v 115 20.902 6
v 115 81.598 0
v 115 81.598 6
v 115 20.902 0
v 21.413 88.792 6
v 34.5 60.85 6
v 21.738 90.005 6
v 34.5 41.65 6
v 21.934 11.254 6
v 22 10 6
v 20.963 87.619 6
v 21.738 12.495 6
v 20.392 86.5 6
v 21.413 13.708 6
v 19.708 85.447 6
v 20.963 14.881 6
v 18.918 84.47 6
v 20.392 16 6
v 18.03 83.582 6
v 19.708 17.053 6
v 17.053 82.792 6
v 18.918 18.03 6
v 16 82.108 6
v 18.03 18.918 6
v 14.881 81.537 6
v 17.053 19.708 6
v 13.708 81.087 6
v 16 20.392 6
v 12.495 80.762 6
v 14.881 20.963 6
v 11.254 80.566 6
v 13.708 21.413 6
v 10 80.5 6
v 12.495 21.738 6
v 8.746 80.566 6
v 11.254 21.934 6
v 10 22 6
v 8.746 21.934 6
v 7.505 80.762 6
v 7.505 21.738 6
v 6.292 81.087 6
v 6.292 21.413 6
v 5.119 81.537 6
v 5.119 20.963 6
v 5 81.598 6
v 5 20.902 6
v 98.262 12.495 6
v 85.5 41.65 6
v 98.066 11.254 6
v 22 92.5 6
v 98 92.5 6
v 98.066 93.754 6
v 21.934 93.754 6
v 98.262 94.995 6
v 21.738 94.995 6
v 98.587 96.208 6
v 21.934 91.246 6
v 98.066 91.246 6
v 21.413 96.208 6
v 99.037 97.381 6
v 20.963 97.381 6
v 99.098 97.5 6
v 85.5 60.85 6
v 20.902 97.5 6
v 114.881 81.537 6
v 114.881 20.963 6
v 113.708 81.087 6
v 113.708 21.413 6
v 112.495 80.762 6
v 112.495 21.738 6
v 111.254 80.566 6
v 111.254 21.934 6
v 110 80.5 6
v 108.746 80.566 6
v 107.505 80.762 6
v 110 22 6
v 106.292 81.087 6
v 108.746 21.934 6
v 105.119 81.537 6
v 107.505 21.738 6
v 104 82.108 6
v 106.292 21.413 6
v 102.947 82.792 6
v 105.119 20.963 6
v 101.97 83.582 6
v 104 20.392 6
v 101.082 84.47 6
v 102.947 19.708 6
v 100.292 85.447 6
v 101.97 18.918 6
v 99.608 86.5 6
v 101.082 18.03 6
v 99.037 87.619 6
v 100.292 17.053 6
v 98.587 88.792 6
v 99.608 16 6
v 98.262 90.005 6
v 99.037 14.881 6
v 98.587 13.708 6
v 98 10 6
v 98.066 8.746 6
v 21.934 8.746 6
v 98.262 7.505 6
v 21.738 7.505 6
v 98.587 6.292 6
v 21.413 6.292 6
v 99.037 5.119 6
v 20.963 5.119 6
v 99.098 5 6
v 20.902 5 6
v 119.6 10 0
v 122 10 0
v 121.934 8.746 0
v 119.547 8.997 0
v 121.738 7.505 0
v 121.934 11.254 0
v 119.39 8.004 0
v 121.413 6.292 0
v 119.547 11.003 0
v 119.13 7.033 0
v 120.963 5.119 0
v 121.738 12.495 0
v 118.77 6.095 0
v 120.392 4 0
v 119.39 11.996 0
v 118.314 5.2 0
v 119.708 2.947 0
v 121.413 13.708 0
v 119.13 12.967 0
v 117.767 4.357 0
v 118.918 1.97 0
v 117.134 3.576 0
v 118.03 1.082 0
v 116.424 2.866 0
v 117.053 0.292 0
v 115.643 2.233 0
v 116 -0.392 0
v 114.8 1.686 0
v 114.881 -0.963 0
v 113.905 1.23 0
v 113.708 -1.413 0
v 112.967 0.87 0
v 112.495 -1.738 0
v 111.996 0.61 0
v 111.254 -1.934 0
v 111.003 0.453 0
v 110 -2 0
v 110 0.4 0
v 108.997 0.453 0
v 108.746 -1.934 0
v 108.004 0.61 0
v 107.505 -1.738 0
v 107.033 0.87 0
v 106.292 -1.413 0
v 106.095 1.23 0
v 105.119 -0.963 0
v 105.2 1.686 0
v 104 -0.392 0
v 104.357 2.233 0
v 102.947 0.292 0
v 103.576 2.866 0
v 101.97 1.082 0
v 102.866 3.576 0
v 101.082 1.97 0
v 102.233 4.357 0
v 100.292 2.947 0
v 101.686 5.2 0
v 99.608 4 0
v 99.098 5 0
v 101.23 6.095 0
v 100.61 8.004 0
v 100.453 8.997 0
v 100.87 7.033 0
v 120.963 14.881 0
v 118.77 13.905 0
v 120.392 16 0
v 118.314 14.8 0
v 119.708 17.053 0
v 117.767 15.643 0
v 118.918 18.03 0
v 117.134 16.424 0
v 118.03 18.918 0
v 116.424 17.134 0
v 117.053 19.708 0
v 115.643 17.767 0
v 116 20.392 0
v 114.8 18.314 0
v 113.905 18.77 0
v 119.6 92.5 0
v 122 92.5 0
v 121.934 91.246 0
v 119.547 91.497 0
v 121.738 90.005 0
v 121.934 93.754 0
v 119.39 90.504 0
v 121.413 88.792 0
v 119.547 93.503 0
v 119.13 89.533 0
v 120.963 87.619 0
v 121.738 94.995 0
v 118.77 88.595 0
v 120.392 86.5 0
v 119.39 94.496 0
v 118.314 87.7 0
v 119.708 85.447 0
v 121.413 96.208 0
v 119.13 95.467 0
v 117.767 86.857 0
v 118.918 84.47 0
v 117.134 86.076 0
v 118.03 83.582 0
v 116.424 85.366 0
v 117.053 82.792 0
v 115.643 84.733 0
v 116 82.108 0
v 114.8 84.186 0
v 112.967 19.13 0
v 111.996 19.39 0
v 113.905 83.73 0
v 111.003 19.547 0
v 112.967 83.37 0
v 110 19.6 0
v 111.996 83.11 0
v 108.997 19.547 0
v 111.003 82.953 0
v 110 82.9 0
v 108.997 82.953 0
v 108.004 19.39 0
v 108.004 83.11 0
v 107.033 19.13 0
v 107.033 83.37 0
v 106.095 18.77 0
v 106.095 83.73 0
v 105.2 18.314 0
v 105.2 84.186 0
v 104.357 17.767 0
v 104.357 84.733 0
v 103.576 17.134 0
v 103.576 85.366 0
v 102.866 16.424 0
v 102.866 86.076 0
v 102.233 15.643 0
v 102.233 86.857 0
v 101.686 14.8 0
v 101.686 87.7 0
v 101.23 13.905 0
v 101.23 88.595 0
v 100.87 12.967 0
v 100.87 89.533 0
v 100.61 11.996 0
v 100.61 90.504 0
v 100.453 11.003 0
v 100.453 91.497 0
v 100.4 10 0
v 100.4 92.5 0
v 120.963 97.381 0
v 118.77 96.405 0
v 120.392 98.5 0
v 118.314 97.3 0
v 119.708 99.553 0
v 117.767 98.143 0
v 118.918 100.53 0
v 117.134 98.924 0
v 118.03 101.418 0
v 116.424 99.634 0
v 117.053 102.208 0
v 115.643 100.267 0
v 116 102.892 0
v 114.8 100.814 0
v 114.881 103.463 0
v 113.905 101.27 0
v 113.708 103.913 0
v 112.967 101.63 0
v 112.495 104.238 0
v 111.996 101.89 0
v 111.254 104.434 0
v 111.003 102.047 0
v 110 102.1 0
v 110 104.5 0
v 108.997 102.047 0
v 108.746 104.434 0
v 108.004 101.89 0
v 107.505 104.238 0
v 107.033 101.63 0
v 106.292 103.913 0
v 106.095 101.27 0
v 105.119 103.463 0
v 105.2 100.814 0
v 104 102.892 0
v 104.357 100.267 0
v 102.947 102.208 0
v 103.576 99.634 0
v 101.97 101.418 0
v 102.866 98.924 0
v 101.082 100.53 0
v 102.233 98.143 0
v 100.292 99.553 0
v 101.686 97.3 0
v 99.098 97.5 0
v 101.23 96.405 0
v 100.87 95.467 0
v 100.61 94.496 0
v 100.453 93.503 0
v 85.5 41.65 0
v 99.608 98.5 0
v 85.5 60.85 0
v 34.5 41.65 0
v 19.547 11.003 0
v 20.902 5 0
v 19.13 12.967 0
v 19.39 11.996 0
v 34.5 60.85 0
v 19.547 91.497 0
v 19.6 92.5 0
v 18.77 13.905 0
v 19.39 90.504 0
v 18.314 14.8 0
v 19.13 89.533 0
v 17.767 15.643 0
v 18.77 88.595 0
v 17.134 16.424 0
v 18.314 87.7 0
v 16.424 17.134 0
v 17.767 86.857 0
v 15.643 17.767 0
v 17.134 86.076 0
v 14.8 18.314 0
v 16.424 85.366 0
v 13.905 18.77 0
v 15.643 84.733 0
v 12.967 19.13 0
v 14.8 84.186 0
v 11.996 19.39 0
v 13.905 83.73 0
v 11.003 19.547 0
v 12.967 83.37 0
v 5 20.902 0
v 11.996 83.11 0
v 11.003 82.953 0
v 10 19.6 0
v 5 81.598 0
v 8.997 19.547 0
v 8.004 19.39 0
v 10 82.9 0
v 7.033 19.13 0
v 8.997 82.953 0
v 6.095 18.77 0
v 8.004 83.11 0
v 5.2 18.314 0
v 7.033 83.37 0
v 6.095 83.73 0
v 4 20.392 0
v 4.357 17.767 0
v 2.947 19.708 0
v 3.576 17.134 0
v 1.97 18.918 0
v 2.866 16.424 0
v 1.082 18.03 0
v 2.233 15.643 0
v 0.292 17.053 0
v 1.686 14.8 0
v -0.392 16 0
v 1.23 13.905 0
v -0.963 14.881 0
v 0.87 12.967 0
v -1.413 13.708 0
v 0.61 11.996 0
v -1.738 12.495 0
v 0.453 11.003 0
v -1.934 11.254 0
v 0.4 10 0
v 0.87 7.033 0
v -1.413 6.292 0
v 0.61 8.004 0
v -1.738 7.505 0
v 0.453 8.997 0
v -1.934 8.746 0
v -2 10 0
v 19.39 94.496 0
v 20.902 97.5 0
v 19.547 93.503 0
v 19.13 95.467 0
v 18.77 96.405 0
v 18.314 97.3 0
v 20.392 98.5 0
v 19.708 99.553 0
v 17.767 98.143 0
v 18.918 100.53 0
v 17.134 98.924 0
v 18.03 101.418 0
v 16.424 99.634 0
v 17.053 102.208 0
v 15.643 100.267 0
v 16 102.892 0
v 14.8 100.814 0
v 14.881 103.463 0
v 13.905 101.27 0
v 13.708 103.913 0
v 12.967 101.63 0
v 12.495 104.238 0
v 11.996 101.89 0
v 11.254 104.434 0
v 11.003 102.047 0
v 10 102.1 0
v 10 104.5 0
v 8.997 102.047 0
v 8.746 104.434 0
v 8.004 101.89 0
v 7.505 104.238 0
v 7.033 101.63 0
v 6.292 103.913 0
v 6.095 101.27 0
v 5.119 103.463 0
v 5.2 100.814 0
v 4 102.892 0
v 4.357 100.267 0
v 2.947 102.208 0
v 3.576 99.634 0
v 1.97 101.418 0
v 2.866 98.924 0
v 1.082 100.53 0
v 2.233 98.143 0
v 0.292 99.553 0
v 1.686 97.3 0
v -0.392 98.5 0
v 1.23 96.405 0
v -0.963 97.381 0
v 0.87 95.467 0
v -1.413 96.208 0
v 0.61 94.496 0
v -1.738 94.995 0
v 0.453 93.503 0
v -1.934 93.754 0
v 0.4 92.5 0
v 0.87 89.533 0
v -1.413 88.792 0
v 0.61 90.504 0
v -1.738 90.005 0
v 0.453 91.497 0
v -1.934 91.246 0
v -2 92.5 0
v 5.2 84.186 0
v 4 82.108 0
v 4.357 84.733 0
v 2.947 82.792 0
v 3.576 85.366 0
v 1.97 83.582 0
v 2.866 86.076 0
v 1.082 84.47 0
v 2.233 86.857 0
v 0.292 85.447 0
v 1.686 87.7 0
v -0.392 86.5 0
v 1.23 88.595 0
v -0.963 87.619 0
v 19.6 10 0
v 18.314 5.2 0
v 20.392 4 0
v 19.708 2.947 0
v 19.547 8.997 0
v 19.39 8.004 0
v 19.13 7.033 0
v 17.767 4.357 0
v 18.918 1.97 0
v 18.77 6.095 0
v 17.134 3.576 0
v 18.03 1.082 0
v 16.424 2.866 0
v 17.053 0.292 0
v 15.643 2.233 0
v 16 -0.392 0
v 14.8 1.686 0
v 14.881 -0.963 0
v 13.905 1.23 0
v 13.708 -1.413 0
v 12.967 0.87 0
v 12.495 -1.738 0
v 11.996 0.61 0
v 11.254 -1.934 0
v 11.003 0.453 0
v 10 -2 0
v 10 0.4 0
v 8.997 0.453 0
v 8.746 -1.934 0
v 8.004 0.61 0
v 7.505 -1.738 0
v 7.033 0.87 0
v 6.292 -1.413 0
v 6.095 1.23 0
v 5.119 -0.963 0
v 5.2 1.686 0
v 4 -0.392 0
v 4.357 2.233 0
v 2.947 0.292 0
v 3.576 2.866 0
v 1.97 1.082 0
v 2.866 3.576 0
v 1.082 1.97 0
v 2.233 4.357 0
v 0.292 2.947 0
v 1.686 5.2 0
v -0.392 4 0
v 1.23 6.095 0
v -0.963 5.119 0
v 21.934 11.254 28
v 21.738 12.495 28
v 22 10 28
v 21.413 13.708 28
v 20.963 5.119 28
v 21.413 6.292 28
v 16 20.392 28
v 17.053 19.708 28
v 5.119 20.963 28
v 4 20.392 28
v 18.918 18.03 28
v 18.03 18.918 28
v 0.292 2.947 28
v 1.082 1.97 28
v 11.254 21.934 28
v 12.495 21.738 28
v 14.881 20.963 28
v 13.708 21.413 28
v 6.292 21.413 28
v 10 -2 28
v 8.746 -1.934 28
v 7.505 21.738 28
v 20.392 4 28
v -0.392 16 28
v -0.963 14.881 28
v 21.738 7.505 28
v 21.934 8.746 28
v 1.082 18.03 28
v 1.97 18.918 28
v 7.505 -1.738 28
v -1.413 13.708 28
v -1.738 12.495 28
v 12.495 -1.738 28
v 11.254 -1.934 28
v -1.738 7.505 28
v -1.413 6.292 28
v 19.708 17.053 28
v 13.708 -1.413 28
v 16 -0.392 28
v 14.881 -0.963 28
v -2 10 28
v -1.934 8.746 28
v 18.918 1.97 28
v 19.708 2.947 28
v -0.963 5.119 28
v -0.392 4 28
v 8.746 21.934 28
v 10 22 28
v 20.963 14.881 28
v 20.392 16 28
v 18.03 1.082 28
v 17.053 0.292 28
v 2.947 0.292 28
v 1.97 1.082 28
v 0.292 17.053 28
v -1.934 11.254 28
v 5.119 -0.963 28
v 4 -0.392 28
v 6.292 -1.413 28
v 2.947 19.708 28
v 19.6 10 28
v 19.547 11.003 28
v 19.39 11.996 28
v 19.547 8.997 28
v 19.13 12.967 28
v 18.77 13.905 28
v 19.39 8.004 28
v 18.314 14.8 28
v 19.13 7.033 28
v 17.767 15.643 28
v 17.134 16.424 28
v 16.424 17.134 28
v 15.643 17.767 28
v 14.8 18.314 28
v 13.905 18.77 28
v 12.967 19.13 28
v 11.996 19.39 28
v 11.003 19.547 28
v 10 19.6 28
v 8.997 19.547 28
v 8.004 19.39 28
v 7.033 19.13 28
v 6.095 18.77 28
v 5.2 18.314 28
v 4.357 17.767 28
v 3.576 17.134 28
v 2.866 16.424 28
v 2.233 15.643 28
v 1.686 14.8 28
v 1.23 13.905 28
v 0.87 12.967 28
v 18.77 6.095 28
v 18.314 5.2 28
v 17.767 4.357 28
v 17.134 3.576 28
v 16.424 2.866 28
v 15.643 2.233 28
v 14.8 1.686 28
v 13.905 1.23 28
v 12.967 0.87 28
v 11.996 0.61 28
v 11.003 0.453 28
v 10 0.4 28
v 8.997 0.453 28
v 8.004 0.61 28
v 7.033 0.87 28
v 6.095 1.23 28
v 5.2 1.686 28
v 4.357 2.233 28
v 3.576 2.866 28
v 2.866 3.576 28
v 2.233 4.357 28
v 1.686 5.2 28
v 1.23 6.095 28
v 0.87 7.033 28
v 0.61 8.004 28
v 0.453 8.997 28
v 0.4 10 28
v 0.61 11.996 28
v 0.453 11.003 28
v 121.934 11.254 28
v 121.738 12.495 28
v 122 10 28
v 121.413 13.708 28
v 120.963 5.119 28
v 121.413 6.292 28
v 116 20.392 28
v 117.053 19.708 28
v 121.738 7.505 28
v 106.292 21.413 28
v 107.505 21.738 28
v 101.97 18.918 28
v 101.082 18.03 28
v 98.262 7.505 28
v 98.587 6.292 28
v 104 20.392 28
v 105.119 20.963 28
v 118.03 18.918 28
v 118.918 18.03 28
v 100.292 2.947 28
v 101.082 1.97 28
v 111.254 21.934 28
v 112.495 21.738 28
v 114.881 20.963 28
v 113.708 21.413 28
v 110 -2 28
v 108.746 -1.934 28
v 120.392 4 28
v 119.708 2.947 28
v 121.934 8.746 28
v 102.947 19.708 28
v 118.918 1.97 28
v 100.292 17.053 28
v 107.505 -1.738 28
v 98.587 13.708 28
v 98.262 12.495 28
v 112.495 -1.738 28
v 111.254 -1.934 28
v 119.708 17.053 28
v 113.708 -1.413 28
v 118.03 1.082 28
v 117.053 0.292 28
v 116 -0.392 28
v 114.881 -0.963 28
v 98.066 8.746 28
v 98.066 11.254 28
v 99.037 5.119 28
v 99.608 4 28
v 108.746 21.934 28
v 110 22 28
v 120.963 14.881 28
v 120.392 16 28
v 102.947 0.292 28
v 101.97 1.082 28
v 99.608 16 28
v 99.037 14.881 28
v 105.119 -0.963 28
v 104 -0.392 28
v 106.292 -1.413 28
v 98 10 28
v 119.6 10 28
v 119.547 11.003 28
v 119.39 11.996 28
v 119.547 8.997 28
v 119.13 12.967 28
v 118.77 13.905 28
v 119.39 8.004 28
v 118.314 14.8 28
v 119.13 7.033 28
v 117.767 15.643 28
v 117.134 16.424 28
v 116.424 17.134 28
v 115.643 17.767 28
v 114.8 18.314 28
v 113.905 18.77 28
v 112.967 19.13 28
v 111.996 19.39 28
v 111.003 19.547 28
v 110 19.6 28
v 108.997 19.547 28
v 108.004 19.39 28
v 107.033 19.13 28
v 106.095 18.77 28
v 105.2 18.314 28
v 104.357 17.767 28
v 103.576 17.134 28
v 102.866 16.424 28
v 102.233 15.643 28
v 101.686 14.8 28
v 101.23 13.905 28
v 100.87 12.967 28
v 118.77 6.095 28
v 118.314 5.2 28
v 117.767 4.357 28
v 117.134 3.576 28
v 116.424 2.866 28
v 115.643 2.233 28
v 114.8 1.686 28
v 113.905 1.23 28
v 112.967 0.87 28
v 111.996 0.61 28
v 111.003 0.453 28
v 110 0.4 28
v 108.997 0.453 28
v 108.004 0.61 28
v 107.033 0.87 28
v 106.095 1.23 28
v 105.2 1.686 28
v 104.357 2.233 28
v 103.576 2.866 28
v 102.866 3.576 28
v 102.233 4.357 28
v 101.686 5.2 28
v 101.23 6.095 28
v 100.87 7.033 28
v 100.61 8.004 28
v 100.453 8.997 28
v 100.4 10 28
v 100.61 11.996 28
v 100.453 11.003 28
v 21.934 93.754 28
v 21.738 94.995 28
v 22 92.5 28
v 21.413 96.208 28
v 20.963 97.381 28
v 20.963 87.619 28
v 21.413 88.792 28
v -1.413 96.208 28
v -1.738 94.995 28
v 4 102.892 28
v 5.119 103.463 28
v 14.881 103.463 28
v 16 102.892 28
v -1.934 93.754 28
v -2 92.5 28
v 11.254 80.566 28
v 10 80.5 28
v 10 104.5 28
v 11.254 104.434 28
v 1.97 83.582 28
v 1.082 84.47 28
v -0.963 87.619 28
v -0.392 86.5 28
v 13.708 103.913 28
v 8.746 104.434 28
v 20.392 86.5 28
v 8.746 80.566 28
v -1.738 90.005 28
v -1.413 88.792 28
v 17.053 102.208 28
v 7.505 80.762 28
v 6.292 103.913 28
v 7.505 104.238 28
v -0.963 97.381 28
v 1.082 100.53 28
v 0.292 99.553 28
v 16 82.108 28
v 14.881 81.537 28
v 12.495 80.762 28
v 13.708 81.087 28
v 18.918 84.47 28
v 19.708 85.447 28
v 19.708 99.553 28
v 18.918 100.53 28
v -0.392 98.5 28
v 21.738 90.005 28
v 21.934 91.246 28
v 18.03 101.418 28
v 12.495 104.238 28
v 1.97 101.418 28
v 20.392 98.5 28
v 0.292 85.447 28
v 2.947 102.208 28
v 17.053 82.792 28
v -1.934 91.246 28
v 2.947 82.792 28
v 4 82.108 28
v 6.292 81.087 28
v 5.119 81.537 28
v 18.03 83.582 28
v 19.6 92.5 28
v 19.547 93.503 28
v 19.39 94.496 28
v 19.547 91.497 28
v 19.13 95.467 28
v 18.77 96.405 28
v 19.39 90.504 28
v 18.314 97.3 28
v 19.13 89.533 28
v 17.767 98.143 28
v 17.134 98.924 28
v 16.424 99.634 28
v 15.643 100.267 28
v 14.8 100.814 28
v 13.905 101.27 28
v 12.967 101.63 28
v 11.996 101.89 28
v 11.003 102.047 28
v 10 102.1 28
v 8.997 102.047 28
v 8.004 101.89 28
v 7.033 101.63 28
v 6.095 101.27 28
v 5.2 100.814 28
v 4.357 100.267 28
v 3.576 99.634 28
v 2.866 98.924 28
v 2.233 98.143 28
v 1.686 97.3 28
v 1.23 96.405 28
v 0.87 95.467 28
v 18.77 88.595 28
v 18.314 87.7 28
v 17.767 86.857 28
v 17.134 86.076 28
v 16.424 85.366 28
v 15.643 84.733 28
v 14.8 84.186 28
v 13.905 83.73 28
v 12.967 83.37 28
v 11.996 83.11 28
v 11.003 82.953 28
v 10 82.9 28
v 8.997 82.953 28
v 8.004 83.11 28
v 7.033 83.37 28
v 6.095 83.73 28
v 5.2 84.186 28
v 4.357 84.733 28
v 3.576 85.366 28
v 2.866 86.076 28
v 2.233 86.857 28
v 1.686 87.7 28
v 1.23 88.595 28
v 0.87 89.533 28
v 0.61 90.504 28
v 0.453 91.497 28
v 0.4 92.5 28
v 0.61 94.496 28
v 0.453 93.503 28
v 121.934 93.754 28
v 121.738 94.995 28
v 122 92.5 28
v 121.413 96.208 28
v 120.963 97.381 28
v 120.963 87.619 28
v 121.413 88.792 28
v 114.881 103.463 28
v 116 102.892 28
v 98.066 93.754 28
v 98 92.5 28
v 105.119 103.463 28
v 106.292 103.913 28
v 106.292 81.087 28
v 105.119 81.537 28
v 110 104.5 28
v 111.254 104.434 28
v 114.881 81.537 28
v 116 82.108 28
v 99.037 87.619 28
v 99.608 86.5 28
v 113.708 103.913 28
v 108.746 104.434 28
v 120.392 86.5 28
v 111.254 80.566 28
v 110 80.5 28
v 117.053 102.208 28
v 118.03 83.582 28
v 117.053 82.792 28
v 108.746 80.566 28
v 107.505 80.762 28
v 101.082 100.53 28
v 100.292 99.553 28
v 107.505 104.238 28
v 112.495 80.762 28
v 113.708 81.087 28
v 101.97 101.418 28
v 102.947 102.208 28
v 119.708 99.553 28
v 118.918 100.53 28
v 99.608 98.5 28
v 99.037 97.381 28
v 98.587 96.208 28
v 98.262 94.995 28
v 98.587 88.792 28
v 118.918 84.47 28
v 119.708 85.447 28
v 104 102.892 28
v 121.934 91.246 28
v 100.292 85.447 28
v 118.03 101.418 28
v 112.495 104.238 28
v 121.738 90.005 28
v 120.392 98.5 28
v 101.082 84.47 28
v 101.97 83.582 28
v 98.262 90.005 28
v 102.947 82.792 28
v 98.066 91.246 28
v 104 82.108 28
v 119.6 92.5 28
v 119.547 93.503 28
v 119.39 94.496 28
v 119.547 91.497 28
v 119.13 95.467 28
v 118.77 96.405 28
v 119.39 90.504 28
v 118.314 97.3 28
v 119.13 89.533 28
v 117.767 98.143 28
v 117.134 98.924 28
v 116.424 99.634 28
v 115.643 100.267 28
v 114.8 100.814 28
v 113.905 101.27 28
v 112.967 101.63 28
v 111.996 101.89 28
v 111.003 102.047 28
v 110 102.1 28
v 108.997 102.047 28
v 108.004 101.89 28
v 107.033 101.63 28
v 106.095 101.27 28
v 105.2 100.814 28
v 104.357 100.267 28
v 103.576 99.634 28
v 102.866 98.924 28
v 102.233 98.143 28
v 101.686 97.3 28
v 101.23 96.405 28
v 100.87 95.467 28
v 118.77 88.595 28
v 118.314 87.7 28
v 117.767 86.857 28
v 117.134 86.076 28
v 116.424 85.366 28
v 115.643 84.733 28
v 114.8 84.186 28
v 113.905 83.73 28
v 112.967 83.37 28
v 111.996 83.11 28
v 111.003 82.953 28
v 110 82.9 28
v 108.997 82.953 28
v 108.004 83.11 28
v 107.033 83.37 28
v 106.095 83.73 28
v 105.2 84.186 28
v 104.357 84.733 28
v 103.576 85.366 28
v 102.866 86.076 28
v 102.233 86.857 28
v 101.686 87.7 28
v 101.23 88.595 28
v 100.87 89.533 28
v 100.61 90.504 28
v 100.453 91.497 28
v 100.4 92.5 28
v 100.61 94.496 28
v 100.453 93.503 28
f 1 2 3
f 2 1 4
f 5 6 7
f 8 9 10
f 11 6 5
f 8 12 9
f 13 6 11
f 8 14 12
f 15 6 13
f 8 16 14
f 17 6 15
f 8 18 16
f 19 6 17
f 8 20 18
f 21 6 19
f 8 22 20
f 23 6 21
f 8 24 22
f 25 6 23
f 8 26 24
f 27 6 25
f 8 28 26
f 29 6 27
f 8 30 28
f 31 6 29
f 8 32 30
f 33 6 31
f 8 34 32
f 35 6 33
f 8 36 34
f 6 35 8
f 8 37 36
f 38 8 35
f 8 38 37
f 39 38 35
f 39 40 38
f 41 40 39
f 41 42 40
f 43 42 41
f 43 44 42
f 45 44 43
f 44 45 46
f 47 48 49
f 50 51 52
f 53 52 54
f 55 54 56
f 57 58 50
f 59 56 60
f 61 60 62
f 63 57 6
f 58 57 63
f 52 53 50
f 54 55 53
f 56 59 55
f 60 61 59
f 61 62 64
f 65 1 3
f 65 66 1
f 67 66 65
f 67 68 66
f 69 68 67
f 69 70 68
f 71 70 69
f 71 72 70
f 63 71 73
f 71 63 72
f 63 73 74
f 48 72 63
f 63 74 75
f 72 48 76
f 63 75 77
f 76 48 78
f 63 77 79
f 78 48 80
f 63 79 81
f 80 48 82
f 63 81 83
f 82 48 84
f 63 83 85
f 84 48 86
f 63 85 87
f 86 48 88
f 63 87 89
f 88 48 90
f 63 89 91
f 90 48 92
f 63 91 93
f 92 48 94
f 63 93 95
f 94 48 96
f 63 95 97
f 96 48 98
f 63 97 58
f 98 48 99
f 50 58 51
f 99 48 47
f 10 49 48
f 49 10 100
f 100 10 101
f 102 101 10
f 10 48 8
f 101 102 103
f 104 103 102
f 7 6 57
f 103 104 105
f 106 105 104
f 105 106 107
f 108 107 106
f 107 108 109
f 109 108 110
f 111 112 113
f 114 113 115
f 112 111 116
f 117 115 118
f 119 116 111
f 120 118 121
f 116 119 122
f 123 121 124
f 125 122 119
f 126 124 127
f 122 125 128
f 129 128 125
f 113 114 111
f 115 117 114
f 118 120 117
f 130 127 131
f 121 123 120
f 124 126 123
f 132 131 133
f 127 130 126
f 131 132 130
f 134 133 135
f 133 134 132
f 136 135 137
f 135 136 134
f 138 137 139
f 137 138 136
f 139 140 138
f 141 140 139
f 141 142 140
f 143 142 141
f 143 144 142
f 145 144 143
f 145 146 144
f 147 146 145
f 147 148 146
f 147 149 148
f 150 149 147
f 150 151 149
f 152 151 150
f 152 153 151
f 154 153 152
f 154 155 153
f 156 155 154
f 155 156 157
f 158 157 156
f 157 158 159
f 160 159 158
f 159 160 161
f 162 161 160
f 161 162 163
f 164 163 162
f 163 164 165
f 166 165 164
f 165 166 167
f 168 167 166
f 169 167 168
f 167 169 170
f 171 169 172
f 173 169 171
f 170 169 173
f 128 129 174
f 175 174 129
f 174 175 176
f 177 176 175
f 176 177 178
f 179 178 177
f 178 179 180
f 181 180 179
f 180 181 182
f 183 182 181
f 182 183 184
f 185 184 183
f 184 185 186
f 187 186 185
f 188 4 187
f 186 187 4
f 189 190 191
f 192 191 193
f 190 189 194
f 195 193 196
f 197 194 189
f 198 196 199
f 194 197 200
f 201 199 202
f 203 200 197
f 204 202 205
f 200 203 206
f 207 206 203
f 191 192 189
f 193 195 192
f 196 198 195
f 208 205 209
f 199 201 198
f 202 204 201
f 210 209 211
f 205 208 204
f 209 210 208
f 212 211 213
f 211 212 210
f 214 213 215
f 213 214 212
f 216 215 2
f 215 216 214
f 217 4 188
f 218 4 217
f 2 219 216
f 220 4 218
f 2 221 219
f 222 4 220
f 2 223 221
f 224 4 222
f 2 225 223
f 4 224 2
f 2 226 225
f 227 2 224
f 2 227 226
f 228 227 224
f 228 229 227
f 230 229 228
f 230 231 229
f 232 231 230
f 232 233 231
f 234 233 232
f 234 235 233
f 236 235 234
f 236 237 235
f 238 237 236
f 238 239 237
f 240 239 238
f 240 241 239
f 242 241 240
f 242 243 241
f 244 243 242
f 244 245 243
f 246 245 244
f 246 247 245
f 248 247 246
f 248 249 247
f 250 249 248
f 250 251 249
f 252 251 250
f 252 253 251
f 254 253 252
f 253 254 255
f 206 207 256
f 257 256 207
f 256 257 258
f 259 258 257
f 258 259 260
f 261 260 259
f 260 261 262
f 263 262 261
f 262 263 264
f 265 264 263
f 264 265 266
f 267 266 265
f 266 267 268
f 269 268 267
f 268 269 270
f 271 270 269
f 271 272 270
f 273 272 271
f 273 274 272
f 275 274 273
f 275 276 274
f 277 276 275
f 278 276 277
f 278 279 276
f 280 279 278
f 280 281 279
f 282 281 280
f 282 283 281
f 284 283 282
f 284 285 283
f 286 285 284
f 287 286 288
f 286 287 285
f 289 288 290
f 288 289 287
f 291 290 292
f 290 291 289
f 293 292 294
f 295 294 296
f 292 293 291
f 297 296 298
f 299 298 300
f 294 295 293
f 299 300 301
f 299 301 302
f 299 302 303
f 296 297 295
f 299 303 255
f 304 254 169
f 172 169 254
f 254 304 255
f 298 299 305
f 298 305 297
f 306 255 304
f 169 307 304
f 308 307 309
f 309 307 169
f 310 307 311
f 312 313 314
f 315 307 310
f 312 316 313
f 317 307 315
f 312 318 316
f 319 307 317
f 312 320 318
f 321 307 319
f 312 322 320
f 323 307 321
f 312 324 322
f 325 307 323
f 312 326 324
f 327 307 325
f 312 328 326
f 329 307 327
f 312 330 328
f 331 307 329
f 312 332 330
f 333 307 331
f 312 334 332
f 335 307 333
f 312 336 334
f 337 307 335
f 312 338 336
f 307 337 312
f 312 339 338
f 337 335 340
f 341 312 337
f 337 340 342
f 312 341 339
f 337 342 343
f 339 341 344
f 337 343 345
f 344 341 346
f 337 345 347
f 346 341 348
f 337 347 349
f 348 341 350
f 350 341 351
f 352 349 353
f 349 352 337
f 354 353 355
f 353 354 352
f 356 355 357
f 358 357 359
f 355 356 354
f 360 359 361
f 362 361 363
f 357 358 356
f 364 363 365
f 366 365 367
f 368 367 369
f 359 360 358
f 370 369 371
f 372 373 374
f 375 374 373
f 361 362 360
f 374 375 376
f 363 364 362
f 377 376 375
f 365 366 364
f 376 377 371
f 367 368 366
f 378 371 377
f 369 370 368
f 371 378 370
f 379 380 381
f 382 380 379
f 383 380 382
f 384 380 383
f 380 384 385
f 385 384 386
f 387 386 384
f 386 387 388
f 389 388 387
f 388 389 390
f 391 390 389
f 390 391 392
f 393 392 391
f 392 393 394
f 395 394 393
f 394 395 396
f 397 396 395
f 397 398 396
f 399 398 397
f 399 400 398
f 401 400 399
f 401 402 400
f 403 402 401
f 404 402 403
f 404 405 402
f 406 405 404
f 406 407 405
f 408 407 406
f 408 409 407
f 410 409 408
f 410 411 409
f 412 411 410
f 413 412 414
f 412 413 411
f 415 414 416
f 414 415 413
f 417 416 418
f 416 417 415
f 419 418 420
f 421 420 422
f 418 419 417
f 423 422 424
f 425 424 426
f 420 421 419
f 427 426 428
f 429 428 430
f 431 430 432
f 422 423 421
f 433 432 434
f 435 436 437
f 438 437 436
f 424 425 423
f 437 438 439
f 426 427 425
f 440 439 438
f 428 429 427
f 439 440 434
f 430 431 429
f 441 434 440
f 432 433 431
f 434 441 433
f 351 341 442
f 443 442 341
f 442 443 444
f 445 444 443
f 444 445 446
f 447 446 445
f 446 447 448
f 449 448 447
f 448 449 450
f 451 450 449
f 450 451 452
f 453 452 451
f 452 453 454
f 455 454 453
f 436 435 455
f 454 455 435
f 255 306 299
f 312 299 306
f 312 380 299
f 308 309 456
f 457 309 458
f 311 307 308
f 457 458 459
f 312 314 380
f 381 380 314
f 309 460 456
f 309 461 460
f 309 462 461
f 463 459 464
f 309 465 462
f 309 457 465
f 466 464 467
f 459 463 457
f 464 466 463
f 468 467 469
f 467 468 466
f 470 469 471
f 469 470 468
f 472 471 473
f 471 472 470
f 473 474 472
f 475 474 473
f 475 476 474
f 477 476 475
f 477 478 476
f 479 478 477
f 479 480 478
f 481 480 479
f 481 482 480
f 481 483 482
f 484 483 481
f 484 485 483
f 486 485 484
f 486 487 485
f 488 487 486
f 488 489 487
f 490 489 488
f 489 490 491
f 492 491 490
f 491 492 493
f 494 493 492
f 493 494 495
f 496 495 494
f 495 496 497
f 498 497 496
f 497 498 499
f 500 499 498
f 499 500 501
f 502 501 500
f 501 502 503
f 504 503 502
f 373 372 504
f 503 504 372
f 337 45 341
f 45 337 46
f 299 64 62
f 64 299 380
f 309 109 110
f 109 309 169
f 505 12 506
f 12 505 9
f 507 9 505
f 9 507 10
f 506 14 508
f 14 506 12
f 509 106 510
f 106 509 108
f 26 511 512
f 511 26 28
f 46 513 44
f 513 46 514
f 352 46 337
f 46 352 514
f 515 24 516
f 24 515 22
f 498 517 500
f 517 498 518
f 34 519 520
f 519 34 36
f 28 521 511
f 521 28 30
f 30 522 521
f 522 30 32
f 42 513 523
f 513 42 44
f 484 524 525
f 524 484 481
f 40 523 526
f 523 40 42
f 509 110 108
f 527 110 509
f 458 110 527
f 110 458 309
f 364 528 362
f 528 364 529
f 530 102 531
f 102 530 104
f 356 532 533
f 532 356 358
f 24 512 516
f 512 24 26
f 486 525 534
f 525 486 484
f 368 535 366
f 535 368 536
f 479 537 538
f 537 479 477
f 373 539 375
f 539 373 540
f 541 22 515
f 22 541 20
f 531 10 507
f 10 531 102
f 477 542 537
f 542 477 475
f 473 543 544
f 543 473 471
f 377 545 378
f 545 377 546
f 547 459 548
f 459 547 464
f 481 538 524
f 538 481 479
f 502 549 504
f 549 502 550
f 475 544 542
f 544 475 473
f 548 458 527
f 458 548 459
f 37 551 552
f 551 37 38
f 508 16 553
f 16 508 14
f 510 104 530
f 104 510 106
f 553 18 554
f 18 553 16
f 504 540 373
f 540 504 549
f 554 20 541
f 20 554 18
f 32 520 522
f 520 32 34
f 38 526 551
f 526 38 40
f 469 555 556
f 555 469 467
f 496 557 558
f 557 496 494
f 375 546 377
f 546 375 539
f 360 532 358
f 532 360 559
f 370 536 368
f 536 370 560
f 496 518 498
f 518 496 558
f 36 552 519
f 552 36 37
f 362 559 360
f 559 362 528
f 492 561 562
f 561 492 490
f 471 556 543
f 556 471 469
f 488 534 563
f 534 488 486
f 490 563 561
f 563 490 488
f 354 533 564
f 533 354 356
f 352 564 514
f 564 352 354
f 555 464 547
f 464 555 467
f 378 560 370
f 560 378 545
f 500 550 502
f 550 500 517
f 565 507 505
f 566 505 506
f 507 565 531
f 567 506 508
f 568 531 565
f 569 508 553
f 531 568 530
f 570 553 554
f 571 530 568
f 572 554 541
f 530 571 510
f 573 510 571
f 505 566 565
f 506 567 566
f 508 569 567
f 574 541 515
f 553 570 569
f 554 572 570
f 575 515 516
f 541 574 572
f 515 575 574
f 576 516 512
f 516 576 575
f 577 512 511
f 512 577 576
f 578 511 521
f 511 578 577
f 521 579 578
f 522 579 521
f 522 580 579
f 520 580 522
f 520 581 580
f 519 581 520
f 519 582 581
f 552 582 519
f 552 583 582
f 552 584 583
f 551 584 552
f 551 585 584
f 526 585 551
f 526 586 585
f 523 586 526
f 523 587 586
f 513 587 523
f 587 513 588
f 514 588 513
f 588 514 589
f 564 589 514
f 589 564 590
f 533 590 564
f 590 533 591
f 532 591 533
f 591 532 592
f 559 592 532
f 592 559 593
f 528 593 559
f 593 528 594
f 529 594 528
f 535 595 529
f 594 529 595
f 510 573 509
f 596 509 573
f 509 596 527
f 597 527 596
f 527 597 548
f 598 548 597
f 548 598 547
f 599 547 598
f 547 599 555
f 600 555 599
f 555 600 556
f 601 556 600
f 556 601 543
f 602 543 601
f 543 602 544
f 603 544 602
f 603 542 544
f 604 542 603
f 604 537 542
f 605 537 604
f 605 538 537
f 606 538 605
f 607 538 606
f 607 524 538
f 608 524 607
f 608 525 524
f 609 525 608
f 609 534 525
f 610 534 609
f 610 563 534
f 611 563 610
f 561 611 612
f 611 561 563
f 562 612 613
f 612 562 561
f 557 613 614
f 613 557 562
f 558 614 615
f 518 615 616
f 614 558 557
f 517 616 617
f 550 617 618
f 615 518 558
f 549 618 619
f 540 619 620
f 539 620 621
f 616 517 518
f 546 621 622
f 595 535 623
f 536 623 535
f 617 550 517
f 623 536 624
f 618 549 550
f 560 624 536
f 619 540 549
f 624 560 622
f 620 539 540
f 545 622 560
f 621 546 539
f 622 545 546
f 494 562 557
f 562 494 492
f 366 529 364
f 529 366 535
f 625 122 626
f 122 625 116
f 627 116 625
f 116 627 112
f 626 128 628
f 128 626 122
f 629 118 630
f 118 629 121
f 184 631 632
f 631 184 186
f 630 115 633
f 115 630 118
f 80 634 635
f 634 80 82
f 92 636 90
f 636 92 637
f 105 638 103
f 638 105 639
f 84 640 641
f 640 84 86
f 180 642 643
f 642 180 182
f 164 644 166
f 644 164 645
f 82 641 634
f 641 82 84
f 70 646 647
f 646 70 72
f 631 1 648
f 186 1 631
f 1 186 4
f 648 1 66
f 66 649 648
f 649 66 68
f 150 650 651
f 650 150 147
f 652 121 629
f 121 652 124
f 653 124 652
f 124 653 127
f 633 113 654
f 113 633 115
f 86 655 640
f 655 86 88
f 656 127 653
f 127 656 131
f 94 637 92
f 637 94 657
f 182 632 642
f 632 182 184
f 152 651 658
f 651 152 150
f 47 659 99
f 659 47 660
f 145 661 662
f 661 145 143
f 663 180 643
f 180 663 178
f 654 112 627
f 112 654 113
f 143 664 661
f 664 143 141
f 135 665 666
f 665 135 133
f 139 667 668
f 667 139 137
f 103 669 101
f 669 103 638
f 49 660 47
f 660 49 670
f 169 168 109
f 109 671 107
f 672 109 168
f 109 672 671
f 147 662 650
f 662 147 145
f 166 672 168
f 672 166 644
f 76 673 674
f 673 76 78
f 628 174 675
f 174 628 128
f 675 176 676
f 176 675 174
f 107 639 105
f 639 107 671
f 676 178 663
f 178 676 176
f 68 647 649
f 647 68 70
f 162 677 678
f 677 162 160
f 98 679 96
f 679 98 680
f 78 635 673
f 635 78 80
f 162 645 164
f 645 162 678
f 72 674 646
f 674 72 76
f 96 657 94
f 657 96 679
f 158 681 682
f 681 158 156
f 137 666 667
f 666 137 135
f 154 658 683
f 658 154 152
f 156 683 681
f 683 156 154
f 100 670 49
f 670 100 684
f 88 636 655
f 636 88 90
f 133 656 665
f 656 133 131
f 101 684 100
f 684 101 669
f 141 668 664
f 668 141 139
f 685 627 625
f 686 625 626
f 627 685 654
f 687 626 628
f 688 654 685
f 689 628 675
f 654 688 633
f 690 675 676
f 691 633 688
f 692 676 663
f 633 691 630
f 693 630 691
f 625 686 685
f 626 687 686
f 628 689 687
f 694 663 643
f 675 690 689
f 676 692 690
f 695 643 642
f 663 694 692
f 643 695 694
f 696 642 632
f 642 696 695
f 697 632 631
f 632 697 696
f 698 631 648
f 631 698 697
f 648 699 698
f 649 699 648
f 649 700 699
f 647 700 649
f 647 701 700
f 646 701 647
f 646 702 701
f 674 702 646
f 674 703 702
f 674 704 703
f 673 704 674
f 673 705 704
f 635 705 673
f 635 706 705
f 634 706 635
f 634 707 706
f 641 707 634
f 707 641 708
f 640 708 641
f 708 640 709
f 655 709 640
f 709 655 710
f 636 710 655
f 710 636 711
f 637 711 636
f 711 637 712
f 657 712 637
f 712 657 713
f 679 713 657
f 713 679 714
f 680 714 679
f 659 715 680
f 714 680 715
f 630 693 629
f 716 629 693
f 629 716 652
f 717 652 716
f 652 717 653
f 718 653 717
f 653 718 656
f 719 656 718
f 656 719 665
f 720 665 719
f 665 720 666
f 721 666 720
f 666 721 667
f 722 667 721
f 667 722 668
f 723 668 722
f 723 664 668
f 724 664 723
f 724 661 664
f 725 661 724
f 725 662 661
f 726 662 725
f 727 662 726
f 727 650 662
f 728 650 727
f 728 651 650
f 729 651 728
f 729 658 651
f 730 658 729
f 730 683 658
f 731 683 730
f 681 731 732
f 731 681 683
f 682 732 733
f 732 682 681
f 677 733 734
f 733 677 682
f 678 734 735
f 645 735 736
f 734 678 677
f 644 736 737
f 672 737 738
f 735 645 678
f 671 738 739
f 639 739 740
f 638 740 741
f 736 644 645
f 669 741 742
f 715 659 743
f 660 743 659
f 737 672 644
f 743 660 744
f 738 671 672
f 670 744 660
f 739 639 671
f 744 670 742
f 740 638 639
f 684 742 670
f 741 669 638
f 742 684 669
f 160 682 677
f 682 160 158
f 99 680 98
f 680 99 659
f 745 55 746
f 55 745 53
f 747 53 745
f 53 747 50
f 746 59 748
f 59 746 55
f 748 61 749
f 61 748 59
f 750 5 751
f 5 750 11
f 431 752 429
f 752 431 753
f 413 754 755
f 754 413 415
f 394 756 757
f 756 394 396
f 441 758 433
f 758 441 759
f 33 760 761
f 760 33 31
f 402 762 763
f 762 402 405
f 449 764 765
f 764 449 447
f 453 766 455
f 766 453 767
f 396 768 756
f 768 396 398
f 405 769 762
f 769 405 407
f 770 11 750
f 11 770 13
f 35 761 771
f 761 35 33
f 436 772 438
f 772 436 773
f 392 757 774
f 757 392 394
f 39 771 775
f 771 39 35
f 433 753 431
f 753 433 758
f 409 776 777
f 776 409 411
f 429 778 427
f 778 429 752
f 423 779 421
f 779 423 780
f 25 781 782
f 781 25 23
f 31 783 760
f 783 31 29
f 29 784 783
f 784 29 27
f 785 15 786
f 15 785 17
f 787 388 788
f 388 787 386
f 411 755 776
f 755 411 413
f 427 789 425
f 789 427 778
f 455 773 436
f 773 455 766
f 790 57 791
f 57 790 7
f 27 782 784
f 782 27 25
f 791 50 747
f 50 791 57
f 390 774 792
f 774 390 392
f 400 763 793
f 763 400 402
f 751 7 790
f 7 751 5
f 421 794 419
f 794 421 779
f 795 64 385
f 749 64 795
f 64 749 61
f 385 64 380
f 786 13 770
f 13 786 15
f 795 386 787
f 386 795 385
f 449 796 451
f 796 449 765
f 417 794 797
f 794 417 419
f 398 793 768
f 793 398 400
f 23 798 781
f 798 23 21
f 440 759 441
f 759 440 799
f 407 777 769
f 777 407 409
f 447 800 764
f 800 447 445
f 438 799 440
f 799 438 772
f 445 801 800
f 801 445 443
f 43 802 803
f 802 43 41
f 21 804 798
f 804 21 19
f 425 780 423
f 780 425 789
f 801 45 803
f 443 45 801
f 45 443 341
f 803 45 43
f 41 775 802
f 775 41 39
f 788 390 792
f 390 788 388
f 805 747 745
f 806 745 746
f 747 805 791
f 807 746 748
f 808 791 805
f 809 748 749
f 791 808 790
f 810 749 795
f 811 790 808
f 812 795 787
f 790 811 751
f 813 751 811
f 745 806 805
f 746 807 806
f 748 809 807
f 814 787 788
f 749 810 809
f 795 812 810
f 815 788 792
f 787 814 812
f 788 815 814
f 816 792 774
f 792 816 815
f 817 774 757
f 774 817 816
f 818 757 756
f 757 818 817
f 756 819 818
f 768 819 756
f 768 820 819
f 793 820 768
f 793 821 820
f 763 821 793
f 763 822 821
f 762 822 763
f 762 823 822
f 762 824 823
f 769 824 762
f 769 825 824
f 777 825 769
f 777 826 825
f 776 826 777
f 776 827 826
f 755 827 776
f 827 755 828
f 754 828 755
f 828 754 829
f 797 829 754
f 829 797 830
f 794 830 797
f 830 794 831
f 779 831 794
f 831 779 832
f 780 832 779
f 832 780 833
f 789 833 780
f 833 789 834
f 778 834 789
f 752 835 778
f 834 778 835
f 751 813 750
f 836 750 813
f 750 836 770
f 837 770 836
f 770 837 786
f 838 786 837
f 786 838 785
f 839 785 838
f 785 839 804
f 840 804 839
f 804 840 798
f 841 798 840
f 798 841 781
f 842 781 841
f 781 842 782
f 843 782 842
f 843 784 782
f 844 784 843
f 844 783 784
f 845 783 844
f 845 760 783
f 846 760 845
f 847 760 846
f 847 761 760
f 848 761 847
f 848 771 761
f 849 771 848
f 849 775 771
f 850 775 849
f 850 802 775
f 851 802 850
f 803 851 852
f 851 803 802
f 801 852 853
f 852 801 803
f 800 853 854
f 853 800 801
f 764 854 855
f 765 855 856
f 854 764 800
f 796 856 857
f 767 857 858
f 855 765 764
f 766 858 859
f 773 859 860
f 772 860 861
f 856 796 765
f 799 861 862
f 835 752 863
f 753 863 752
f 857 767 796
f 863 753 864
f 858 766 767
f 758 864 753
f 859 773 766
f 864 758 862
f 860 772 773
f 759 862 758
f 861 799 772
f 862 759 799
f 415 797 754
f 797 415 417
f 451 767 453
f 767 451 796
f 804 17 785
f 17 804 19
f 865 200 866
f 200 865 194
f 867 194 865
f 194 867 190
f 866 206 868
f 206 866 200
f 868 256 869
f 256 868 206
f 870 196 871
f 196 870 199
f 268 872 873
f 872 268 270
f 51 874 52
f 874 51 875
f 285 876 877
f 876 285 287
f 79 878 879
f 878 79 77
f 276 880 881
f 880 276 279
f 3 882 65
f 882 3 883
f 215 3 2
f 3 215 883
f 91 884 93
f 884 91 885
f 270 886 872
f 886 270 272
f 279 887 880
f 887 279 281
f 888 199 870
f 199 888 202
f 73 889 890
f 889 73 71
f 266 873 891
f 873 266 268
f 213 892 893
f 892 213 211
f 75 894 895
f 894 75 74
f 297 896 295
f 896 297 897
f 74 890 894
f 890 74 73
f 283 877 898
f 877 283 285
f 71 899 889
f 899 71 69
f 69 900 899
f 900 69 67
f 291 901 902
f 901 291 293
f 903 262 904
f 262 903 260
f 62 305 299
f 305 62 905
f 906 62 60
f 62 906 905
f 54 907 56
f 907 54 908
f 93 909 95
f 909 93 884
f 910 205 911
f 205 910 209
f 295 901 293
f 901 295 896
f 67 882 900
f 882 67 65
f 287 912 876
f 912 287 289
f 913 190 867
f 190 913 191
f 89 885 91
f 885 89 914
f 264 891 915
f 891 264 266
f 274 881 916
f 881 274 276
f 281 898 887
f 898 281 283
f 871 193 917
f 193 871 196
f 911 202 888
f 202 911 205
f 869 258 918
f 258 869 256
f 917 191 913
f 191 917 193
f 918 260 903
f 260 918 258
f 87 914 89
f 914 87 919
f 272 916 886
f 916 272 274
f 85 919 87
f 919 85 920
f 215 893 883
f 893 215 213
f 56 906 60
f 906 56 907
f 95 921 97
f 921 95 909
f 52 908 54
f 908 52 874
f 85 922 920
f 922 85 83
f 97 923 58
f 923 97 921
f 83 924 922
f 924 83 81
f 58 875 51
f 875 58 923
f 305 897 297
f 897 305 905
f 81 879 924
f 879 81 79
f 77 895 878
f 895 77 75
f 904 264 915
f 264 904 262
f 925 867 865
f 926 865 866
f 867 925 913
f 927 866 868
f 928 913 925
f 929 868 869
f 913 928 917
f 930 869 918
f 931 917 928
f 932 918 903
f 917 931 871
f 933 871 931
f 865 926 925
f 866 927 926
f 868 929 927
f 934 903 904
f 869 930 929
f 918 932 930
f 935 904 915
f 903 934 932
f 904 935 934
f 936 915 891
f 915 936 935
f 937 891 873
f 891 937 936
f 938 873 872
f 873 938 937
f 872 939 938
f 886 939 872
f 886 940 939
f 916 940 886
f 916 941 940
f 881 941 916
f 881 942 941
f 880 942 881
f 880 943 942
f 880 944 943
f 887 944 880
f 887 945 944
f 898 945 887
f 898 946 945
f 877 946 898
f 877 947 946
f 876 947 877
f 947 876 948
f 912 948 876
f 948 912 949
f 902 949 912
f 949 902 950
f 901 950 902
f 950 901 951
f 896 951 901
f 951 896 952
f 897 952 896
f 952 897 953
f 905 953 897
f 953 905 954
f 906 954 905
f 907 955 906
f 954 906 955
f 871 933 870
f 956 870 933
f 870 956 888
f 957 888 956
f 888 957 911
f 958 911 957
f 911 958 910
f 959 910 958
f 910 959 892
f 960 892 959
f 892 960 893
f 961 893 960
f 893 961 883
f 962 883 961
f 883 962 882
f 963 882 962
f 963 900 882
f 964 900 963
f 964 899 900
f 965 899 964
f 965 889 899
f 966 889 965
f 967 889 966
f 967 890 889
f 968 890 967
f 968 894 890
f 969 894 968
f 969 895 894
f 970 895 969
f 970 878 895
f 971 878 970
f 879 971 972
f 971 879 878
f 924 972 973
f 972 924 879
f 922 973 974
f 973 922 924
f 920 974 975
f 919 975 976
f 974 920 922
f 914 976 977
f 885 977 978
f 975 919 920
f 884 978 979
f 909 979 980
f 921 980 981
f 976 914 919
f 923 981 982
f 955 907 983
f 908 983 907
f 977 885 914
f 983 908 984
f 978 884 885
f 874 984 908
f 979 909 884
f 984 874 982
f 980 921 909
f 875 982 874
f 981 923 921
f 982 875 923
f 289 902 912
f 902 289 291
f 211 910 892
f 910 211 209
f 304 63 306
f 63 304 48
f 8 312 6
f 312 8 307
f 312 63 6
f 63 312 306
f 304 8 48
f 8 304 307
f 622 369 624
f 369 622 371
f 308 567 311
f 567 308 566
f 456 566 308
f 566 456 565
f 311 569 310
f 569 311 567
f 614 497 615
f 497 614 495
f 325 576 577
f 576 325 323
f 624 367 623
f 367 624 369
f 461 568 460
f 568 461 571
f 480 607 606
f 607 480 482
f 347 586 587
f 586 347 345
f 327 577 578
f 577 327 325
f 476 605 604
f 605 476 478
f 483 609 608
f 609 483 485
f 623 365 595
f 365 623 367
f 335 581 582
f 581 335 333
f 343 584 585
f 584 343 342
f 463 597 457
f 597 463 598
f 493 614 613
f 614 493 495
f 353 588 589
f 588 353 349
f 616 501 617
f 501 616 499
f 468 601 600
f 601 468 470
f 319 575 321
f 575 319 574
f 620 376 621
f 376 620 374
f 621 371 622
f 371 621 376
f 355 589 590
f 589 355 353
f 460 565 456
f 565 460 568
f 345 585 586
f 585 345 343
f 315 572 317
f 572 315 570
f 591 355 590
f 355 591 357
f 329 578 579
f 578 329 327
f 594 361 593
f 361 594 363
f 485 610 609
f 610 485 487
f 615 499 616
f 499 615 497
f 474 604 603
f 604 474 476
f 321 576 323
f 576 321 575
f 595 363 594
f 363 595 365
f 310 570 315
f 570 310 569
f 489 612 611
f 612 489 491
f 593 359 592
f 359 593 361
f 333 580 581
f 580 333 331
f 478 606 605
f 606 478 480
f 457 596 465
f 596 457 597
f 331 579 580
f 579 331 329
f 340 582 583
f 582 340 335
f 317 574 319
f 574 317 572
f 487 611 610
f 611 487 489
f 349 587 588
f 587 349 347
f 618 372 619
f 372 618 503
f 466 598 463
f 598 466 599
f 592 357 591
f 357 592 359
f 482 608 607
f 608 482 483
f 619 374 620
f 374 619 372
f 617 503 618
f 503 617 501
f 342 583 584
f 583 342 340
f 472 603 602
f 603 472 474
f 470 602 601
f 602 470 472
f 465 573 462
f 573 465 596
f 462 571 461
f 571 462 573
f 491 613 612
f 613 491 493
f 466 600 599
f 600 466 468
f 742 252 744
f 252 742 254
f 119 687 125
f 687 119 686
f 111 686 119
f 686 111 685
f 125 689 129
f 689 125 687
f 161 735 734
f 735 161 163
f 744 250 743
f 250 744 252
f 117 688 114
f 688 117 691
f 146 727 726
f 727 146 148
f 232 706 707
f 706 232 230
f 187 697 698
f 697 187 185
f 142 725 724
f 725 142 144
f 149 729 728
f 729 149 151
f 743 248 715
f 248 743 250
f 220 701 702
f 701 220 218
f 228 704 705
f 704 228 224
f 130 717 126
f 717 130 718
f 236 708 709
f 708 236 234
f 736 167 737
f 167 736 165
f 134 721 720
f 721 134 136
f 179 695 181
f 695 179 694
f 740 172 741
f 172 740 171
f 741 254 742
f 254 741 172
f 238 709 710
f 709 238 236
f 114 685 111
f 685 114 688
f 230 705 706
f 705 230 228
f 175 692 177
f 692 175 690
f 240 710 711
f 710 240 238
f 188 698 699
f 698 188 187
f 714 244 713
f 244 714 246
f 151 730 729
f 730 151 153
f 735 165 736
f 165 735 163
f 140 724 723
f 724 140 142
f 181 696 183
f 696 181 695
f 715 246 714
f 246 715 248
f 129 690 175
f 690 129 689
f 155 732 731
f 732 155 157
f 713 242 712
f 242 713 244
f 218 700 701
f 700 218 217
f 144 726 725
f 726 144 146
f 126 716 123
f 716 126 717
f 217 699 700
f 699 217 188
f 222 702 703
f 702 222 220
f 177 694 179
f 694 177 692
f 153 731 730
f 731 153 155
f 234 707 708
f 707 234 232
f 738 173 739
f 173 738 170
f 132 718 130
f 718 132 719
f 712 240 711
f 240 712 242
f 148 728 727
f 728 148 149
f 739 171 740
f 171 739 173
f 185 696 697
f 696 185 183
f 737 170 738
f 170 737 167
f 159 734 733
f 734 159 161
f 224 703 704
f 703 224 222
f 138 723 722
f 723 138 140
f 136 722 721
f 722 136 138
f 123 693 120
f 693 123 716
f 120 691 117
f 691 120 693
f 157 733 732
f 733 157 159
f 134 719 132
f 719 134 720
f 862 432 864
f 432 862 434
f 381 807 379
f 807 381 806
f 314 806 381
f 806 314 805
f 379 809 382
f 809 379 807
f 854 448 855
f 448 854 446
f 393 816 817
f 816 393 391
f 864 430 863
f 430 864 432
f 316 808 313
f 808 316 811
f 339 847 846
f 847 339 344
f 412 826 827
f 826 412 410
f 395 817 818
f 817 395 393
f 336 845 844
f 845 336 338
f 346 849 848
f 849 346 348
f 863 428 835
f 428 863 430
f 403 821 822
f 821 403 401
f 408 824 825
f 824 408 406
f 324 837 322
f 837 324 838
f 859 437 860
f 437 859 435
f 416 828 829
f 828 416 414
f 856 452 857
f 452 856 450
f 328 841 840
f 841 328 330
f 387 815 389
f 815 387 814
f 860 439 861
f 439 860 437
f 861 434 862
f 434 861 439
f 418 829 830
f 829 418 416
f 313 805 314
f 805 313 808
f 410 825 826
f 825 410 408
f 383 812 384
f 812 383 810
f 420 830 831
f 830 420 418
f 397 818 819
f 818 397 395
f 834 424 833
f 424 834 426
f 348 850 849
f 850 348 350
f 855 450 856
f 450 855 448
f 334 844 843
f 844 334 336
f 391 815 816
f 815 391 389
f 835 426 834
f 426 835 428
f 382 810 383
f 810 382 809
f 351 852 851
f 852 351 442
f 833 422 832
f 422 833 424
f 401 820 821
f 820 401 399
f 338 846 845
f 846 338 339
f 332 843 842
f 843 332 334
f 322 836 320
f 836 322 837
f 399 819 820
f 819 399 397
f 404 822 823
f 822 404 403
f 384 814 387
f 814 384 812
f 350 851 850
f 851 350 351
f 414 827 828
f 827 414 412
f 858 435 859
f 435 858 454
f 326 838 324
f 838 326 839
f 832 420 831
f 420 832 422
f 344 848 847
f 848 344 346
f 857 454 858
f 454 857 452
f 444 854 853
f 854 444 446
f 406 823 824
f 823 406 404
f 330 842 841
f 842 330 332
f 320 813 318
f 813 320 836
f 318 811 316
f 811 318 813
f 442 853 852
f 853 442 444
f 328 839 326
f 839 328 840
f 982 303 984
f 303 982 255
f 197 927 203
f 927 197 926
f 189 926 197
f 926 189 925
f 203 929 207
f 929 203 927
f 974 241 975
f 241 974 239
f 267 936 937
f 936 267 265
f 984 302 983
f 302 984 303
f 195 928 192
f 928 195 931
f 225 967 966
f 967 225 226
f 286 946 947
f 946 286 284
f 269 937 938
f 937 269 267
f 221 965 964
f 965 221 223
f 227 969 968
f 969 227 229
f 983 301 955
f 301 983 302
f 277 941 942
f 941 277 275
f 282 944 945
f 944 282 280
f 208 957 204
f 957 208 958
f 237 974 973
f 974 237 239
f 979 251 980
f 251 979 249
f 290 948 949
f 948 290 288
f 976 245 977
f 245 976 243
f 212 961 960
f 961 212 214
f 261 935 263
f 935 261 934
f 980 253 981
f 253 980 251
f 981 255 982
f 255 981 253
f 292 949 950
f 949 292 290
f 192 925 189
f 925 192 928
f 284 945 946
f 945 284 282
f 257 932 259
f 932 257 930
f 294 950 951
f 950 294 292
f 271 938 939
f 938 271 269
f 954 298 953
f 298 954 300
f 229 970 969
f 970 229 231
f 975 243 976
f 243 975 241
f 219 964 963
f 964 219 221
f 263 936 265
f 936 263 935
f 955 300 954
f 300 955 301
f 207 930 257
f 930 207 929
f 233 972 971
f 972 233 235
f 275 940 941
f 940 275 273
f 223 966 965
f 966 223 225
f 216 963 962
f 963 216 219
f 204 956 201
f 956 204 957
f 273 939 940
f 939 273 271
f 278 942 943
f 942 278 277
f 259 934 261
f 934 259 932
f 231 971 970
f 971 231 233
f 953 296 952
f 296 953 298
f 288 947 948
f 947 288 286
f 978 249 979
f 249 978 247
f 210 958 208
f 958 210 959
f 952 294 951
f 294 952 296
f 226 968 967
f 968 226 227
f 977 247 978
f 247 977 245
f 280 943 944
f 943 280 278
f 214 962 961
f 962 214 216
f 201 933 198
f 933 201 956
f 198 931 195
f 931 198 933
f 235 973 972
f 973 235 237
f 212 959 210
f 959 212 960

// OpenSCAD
$fn=60;

difference(){
union(){
translate([5,5,0])cube([110,92.5,6]);
translate([10,10,0])cylinder(d=24,h=28,$fn=60);
translate([110,10,0])cylinder(d=24,h=28,$fn=60);
translate([10,92.5,0])cylinder(d=24,h=28,$fn=60);
translate([110,92.5,0])cylinder(d=24,h=28,$fn=60);
}

translate([10,10,-1])cylinder(d=10.4,h=90,$fn=60);
translate([110,10,-1])cylinder(d=10.4,h=90,$fn=60);
translate([10,92.5,-1])cylinder(d=10.4,h=90,$fn=60);
translate([110,92.5,-1])cylinder(d=10.4,h=90,$fn=60);

translate([60,51.25,-1])cube([51,19.2,20],center=true);

translate([10,10,-1])cylinder(d=19.2,h=90,$fn=60);
translate([110,10,-1])cylinder(d=19.2,h=90,$fn=60);
translate([10,92.5,-1])cylinder(d=19.2,h=90,$fn=60);
translate([110,92.5,-1])cylinder(d=19.2,h=90,$fn=60);
}
